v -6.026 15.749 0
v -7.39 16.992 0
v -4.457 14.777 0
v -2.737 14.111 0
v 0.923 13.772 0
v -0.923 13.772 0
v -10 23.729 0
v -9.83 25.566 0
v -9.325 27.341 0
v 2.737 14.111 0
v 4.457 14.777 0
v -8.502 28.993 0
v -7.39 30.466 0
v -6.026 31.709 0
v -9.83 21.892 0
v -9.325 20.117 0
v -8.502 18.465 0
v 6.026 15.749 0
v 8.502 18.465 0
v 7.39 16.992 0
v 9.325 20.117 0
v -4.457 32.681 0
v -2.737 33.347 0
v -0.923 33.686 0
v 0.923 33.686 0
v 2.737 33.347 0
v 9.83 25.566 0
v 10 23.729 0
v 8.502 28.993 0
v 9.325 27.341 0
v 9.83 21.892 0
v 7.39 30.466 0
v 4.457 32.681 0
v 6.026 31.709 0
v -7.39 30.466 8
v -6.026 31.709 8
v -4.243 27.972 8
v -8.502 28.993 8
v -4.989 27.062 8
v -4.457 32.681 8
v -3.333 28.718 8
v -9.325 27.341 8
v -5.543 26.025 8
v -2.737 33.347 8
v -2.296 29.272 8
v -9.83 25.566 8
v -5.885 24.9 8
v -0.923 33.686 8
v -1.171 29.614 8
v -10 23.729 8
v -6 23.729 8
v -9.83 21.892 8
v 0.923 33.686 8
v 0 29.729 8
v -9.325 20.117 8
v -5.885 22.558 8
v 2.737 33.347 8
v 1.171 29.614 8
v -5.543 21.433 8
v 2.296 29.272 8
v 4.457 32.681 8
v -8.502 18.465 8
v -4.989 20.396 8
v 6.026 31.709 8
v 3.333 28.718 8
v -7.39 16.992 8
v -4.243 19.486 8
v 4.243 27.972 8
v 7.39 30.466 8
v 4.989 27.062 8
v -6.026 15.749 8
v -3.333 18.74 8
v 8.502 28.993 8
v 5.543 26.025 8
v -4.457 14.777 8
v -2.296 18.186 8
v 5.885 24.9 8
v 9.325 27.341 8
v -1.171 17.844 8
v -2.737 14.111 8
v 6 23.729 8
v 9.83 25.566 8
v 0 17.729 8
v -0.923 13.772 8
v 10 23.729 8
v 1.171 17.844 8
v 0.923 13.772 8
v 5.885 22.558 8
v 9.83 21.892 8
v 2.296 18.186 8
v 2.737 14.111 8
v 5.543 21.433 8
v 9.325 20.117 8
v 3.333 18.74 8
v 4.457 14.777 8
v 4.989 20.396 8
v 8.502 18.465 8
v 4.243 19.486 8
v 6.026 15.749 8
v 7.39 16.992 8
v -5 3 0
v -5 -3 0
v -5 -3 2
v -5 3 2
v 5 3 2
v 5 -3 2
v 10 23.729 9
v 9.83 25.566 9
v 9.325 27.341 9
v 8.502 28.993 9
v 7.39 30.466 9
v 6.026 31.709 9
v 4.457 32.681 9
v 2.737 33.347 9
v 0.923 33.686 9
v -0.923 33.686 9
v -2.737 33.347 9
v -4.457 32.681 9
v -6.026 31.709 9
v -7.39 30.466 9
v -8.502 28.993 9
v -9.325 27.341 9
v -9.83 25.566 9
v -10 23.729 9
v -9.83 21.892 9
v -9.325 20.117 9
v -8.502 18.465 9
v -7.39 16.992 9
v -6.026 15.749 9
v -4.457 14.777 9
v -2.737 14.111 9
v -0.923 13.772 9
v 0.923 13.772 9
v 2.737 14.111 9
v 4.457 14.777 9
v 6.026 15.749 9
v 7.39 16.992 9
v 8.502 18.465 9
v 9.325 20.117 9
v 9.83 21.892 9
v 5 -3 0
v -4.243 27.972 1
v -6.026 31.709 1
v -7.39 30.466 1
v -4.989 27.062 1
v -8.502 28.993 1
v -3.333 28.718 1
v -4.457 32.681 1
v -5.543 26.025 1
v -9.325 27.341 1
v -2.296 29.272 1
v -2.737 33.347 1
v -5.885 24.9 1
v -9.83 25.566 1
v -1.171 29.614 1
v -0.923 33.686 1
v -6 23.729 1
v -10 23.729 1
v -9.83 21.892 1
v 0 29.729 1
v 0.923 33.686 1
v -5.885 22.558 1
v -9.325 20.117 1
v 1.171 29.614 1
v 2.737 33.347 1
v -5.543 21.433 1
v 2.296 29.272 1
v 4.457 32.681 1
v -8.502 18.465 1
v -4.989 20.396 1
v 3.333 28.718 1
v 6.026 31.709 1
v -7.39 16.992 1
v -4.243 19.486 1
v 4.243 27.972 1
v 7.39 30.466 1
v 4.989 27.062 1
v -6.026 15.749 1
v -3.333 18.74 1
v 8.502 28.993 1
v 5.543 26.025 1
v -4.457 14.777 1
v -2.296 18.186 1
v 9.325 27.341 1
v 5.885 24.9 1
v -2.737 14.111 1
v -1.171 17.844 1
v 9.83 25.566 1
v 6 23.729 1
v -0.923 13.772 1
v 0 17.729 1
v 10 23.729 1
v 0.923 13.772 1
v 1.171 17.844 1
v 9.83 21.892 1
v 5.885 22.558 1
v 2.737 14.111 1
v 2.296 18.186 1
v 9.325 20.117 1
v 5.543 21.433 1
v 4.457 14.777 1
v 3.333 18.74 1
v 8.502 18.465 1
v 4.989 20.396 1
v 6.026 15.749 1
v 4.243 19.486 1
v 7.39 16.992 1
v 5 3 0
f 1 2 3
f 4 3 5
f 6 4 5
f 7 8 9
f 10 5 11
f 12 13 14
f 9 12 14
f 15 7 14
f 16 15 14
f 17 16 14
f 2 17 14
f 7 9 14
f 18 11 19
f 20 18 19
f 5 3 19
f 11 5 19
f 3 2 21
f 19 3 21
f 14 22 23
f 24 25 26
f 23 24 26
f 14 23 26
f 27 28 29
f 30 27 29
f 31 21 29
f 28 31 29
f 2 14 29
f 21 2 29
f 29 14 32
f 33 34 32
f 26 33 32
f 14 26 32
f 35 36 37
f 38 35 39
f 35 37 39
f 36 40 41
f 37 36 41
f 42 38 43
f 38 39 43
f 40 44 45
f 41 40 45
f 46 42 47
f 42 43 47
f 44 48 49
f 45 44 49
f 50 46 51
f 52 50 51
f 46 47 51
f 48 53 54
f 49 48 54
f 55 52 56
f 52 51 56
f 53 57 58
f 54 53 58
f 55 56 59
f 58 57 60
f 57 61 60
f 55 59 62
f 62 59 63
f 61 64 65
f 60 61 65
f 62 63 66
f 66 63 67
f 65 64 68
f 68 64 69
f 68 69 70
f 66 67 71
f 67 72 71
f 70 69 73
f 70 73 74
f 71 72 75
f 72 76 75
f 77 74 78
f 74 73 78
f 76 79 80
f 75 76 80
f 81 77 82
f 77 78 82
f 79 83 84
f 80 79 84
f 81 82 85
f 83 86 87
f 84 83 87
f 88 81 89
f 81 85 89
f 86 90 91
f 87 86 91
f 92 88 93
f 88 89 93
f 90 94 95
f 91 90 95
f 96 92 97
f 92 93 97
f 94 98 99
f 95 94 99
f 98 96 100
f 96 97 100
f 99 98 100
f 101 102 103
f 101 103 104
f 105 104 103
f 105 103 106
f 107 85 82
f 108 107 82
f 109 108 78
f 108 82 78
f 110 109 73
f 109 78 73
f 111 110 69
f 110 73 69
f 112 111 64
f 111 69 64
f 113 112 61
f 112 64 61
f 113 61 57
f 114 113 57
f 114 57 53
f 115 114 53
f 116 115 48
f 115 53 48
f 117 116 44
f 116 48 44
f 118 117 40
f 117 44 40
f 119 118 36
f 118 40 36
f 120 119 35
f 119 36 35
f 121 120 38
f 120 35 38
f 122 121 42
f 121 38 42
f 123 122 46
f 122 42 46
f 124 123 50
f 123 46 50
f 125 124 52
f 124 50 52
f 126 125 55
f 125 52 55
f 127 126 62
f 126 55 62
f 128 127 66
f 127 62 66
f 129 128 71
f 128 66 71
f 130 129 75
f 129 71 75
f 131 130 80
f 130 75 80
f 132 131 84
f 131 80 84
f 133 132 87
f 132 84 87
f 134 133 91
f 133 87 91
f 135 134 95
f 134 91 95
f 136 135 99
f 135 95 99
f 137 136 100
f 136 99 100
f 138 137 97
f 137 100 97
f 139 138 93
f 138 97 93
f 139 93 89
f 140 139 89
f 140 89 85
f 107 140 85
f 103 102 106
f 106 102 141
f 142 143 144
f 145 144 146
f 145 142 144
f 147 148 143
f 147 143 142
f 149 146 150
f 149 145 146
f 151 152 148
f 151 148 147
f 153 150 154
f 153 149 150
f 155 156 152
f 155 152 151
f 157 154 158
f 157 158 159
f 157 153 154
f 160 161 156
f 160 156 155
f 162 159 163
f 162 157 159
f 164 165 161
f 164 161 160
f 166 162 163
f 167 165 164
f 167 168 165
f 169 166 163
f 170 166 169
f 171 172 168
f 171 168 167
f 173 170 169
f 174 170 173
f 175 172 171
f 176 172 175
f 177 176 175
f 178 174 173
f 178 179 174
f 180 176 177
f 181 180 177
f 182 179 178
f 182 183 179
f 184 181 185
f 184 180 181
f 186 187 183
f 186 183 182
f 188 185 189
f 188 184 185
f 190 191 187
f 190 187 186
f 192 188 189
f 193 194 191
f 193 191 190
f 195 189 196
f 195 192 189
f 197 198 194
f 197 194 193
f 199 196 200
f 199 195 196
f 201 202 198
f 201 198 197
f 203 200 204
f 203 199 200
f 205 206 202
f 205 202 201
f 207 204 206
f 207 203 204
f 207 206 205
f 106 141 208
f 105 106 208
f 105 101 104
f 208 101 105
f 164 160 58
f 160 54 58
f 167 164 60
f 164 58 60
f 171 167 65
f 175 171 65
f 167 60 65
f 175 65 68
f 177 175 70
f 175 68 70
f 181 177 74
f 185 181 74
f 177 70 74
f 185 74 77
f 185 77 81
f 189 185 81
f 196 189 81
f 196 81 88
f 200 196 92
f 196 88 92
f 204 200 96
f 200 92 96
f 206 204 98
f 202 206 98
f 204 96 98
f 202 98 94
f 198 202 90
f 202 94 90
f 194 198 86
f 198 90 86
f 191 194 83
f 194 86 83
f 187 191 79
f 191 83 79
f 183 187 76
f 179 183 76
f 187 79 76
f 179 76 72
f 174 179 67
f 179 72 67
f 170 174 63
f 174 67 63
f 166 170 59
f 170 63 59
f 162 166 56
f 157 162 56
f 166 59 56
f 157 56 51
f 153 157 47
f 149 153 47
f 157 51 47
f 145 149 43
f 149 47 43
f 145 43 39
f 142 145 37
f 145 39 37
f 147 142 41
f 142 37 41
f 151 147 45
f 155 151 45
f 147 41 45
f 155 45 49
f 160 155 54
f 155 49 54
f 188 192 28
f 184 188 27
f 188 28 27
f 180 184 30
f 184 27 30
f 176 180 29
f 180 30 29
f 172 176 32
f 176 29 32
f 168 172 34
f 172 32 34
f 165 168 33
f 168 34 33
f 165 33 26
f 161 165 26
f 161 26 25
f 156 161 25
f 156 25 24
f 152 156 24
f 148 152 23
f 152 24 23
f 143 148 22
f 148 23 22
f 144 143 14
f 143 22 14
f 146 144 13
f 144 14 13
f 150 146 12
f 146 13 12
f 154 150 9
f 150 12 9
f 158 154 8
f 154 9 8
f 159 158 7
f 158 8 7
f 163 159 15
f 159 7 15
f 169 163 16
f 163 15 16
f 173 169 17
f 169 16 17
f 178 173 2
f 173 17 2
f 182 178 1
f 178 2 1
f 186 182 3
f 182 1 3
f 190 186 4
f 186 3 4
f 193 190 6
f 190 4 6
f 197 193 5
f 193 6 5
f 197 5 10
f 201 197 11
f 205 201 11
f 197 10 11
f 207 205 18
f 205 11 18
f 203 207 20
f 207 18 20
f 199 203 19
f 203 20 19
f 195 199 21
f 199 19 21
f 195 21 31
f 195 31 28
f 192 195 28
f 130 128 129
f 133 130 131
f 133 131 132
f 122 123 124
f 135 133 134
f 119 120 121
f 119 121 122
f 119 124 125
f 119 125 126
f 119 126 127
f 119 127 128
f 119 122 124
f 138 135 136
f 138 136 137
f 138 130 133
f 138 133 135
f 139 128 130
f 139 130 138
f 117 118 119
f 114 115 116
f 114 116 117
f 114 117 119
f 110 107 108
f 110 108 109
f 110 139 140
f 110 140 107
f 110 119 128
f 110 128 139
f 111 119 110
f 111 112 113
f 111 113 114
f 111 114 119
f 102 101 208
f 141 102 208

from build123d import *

# Parameters (mm, degrees)
F0_W      = 10
F0_H      = 6
F0_R      = 10
F1_DEPTH  = 2
F1_FACE_R = 10
F2_DEPTH  = 7
F3_W      = 4
F3_H      = 7


with BuildPart() as f1:
    # F0 (on Top) → F1 (new body)
    with BuildSketch(Plane.XY):
        Rectangle(F0_W, F0_H)
        with Locations((0, 23.728996)):
            Circle(F0_R)
    extrude(amount=F1_DEPTH)

    # F1_face (on face) → F2 (join)
    with BuildSketch(Plane(origin=(0, 23.728996, 2), x_dir=(1, 0, 0), z_dir=(0, 0, 1))):
        Circle(F1_FACE_R)
    extrude(amount=F2_DEPTH)

    # F3 (on Right) → F4 (revolve, cut)
    with BuildSketch(Plane.YZ):
        with Locations((31.728996, 4.5)):
            Rectangle(F3_W, F3_H)
    revolve(axis=Axis((0, 23.728996, 4.5), (0, 0, -1)), mode=Mode.SUBTRACT)


solid = f1.part
